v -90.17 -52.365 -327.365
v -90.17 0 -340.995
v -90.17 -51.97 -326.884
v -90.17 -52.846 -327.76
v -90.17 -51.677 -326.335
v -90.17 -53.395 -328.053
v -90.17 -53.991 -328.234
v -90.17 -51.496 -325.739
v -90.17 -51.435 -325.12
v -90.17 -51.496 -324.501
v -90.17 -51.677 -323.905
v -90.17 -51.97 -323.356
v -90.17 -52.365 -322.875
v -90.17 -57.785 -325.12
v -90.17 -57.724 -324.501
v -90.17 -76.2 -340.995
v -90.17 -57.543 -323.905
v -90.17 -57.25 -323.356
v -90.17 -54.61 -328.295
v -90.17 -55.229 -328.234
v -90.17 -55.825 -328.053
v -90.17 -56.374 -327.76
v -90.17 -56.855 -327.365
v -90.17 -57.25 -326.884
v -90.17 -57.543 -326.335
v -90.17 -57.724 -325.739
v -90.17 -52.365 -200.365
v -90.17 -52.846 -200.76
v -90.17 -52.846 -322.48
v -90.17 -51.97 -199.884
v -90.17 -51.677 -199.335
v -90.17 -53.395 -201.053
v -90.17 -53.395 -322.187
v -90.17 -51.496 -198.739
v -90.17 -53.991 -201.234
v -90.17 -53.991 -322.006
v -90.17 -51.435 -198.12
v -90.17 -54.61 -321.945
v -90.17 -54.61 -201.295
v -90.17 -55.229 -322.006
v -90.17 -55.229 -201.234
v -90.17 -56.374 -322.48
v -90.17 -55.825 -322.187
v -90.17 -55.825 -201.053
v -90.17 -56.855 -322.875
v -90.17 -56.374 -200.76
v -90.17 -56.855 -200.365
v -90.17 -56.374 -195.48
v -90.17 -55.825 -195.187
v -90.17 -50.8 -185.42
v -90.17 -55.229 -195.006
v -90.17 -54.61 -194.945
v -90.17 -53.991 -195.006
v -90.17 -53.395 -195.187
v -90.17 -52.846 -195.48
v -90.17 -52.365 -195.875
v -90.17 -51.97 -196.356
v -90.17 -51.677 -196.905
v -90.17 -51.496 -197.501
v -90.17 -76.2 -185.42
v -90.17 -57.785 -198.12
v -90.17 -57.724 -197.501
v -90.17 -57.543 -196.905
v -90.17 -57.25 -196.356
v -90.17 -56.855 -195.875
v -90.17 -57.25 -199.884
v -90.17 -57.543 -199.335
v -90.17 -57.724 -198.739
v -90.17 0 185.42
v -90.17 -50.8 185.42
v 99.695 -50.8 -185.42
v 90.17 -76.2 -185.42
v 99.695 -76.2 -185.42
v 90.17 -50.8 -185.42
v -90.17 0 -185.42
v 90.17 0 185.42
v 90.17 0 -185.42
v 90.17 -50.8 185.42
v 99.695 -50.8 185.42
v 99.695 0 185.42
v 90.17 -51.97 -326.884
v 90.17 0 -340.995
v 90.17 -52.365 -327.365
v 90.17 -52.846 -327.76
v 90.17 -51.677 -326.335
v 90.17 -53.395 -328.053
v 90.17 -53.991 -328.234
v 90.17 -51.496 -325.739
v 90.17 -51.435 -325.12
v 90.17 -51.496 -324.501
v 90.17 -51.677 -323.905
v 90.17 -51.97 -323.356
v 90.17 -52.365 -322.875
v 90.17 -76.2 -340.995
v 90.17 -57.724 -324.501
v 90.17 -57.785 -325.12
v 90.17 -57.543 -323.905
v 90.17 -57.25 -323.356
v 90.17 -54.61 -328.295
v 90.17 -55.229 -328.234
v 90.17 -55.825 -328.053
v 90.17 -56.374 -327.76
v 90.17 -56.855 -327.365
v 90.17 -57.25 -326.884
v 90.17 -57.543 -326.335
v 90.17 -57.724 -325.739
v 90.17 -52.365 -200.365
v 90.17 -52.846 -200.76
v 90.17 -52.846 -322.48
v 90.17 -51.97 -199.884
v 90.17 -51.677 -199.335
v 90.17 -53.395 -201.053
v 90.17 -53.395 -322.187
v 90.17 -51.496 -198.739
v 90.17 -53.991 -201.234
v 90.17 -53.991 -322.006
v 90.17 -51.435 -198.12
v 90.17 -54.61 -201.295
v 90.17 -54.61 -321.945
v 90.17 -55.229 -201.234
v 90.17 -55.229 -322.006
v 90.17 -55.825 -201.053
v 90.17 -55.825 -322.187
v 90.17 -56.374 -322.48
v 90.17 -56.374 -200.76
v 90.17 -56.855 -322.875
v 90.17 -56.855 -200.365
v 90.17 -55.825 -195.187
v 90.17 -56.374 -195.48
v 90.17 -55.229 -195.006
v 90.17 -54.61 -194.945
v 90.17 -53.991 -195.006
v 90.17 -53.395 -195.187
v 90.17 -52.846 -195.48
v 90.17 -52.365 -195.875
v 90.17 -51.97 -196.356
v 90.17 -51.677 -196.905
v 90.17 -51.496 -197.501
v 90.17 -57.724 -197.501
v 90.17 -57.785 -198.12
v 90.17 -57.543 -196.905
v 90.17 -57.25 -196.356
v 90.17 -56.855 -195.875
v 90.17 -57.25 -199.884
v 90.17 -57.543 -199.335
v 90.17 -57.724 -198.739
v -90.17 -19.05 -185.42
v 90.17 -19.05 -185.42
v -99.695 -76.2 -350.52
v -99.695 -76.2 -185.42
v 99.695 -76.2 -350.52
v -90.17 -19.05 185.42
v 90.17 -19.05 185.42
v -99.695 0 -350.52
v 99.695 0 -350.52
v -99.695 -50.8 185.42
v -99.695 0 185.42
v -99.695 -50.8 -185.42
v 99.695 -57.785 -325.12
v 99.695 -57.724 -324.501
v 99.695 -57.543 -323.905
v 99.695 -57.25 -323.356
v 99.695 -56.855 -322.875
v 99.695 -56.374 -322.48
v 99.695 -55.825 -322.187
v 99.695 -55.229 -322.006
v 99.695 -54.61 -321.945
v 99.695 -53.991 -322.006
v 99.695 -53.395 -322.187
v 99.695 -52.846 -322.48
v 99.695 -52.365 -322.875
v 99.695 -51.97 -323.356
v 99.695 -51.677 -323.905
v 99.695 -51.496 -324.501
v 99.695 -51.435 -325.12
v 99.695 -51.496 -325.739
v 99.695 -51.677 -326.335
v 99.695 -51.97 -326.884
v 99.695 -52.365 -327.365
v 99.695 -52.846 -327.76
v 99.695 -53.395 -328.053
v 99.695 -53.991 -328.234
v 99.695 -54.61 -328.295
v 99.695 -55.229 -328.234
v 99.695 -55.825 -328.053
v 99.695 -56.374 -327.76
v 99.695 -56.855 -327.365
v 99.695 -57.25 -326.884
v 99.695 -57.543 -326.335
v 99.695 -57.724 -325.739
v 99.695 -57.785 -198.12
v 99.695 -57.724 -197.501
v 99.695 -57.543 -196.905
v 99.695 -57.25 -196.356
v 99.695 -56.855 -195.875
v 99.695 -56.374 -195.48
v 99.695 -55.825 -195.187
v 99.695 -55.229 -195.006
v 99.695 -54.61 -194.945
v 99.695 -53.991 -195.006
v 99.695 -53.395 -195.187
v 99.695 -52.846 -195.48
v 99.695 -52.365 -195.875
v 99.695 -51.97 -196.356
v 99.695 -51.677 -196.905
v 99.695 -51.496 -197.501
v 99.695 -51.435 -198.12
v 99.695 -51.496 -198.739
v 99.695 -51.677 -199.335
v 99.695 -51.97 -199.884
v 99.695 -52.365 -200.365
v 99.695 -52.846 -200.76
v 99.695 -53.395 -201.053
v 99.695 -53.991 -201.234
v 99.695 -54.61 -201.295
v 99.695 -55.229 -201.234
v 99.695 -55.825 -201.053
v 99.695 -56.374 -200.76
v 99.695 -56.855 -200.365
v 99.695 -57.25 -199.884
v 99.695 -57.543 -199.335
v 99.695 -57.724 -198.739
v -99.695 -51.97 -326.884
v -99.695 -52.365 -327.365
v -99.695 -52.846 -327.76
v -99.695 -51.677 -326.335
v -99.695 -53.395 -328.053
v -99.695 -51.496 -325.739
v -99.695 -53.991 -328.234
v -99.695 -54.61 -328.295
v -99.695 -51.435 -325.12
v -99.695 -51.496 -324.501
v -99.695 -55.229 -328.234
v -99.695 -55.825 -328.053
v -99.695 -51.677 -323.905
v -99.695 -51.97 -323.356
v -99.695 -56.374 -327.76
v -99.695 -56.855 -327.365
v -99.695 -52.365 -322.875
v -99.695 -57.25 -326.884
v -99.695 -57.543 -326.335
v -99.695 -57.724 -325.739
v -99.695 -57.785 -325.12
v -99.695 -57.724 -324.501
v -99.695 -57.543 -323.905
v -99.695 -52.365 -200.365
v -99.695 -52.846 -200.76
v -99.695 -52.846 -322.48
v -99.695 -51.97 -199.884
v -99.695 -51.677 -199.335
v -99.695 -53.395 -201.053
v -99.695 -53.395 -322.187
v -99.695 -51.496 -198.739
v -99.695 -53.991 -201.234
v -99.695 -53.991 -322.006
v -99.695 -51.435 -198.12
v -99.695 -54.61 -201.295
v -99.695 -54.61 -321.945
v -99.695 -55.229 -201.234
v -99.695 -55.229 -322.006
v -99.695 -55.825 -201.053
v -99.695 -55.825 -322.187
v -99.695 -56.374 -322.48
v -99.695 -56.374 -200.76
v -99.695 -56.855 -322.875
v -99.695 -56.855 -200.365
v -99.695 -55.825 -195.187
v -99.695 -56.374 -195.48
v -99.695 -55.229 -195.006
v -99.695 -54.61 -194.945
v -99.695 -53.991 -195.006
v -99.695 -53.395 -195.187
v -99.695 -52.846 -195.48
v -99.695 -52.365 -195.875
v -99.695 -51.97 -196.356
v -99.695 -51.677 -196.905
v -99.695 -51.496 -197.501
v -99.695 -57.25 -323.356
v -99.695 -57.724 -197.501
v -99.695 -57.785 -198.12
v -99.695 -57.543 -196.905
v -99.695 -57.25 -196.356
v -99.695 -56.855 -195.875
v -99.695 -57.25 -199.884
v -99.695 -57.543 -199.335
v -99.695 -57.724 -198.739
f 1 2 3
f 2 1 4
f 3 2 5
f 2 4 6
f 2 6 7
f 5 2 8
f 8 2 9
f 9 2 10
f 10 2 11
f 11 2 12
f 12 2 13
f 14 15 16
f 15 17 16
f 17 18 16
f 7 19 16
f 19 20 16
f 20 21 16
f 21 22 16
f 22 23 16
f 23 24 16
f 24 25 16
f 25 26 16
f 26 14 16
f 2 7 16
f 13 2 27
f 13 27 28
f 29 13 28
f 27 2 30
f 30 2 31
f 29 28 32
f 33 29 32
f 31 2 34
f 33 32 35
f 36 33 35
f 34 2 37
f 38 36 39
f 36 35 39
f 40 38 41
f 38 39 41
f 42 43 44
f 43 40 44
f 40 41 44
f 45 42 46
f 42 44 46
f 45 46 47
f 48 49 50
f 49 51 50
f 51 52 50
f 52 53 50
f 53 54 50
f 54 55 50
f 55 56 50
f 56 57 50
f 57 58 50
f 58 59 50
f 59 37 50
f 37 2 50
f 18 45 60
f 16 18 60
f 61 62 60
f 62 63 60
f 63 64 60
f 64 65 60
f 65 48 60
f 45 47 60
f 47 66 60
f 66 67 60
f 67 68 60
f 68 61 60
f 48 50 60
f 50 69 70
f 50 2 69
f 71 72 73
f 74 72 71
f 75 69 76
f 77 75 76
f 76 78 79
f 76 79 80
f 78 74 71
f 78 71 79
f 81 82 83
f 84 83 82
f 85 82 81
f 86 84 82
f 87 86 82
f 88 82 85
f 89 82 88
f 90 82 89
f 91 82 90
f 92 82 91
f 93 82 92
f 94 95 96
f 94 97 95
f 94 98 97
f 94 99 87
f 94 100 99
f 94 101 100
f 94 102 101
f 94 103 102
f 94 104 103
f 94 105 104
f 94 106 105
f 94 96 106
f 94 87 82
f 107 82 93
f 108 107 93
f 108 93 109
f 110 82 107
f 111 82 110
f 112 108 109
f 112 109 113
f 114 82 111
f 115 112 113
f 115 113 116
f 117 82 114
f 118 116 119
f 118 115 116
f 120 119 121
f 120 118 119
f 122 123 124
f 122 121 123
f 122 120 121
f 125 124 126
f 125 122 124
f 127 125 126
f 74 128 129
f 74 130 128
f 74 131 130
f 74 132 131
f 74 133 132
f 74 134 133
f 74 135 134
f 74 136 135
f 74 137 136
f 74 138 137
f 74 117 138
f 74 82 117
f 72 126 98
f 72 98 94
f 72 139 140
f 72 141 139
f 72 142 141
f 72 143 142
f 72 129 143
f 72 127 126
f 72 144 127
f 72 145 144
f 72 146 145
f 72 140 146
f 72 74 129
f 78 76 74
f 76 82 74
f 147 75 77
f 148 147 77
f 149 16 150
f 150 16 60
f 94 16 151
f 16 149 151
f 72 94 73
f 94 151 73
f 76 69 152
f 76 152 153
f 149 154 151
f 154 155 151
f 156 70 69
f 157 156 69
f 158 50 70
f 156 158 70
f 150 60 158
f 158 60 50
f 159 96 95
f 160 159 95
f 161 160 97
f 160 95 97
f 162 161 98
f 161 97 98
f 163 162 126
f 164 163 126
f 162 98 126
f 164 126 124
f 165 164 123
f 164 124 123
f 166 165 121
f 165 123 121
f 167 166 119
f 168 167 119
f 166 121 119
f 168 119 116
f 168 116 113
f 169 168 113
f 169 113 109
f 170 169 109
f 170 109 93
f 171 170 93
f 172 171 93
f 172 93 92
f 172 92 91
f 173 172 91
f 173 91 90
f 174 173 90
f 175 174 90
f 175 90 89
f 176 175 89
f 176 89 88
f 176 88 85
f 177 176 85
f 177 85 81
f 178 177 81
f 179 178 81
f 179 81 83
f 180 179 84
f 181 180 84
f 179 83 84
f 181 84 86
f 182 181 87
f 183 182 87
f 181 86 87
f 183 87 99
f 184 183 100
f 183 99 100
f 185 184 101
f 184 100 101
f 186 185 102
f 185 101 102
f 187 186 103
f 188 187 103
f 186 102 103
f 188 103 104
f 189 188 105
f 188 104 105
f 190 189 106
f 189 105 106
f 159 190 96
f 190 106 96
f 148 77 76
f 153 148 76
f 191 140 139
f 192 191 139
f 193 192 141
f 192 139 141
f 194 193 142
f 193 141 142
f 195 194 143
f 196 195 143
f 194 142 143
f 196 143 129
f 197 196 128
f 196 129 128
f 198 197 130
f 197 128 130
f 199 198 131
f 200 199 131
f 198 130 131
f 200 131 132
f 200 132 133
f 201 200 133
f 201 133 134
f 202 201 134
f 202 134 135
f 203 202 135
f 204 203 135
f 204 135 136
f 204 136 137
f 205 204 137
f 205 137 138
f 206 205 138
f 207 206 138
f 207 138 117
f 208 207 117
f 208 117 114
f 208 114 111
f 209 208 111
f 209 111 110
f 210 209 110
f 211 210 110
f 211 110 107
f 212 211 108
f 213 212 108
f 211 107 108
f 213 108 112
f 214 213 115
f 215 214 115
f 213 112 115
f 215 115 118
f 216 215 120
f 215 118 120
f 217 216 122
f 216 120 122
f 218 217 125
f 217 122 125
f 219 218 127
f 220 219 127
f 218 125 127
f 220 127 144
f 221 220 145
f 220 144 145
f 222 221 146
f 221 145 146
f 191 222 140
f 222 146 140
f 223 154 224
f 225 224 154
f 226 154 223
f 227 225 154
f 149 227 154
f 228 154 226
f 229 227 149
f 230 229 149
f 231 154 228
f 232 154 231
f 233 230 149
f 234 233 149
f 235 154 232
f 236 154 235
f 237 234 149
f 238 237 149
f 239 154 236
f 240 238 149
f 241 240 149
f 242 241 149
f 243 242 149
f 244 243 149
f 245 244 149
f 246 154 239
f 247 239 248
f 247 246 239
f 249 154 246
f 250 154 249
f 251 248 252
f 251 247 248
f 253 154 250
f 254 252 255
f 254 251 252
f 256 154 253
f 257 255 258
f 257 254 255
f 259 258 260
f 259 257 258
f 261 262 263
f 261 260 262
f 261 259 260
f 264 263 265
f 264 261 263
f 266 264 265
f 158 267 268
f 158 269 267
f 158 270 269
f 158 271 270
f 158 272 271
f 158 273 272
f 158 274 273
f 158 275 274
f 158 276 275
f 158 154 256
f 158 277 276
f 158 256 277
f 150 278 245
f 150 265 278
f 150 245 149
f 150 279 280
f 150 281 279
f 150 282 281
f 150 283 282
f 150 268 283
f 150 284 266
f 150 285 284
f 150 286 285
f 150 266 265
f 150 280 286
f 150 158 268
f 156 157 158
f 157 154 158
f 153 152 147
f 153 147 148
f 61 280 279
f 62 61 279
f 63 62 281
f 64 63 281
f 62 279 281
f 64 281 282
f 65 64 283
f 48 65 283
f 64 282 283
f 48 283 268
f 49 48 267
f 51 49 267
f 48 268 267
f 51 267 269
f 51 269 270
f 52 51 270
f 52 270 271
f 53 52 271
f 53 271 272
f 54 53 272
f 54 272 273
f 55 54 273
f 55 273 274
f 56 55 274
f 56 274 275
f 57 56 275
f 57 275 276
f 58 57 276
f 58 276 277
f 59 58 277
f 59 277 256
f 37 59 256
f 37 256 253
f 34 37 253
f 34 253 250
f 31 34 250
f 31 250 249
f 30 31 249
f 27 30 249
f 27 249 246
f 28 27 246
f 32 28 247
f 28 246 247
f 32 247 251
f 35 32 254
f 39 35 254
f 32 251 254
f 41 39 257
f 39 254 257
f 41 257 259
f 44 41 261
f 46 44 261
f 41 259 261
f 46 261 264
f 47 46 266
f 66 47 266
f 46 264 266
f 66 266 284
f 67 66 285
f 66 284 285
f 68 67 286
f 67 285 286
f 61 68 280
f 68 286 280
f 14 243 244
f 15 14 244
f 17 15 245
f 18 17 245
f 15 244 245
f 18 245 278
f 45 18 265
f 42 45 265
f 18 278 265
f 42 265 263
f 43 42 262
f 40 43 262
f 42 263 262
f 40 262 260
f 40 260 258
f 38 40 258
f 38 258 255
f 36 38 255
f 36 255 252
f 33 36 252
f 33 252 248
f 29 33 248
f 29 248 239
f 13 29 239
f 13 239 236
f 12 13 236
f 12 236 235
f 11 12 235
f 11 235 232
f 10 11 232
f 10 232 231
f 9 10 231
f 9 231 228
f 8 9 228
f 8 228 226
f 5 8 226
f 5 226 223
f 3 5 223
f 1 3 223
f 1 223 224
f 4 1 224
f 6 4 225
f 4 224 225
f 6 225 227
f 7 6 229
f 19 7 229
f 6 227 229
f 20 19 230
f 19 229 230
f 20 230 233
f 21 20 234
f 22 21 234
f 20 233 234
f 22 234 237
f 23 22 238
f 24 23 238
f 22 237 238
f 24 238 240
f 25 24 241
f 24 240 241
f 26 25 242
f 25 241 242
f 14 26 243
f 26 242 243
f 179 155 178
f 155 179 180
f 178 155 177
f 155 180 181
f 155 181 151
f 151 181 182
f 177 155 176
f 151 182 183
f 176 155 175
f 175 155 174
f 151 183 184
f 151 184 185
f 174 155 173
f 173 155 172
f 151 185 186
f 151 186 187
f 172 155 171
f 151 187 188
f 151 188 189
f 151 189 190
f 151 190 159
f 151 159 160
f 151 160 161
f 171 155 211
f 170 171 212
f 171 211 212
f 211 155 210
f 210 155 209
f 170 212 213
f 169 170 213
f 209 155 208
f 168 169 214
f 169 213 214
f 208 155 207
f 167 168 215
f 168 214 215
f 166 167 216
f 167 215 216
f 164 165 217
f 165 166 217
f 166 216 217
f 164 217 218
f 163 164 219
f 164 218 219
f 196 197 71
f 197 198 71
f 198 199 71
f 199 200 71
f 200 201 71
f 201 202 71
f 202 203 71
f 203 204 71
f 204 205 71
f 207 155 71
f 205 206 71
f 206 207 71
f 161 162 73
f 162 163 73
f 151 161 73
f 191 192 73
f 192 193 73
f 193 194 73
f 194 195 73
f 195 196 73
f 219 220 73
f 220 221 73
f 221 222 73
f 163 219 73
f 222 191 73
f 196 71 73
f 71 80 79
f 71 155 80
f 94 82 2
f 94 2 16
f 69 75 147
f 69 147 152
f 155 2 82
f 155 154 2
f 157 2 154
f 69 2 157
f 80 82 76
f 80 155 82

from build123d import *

# Parameters (mm, degrees)
F0_W     = 180.34
F0_H     = 370.84
F1_DEPTH = 19.05
F4_DEPTH = 9.525
F6_W     = 76.2
F6_H     = 9.525
F7_DEPTH = 180.34
F8_R     = 3.175
F9_DEPTH = 199.391


with BuildPart() as f1:
    # F0 (on Front) → F1 (new body)
    with BuildSketch(Plane.XZ):
        Rectangle(F0_W, F0_H)
    extrude(amount=F1_DEPTH)


with BuildPart() as f4:
    # F3 (on face) → F4 (new body)
    with BuildSketch(Plane(origin=(-90.17, 0, 0), x_dir=(0, -1, 0), z_dir=(-1, 0, 0))):
        Polygon((50.8, 185.42), (0, 185.42), (0, -350.52), (50.8, -350.52), (76.2, -350.52), (76.2, -185.42), (50.8, -185.42), align=None)
    extrude(amount=F4_DEPTH)


with BuildPart() as f5_1:
    # F5: instance of F4
    add(f4.part.mirror(Plane.YZ))


with BuildPart() as f4_1:
    add(f4.part)

    add(f5_1.part)  # F7 merges F5_1
    # F6 (on face) → F7 (join, through all)
    with BuildSketch(Plane(origin=(90.17, 0, 0), x_dir=(0, -1, 0), z_dir=(-1, 0, 0))):
        with Locations((38.1, -345.7575)):
            Rectangle(F6_W, F6_H)
    extrude(amount=F7_DEPTH)

    # F8 (on face) → F9 (cut, through all)
    with BuildSketch(Plane(origin=(-99.695, 0, 0), x_dir=(0, -1, 0), z_dir=(-1, 0, 0))):
        with Locations((54.61, -198.12)):
            Circle(F8_R)
        with Locations((54.61, -325.12)):
            Circle(F8_R)
    extrude(amount=-F9_DEPTH, mode=Mode.SUBTRACT)


solid = Compound([f1.part, f4_1.part])
